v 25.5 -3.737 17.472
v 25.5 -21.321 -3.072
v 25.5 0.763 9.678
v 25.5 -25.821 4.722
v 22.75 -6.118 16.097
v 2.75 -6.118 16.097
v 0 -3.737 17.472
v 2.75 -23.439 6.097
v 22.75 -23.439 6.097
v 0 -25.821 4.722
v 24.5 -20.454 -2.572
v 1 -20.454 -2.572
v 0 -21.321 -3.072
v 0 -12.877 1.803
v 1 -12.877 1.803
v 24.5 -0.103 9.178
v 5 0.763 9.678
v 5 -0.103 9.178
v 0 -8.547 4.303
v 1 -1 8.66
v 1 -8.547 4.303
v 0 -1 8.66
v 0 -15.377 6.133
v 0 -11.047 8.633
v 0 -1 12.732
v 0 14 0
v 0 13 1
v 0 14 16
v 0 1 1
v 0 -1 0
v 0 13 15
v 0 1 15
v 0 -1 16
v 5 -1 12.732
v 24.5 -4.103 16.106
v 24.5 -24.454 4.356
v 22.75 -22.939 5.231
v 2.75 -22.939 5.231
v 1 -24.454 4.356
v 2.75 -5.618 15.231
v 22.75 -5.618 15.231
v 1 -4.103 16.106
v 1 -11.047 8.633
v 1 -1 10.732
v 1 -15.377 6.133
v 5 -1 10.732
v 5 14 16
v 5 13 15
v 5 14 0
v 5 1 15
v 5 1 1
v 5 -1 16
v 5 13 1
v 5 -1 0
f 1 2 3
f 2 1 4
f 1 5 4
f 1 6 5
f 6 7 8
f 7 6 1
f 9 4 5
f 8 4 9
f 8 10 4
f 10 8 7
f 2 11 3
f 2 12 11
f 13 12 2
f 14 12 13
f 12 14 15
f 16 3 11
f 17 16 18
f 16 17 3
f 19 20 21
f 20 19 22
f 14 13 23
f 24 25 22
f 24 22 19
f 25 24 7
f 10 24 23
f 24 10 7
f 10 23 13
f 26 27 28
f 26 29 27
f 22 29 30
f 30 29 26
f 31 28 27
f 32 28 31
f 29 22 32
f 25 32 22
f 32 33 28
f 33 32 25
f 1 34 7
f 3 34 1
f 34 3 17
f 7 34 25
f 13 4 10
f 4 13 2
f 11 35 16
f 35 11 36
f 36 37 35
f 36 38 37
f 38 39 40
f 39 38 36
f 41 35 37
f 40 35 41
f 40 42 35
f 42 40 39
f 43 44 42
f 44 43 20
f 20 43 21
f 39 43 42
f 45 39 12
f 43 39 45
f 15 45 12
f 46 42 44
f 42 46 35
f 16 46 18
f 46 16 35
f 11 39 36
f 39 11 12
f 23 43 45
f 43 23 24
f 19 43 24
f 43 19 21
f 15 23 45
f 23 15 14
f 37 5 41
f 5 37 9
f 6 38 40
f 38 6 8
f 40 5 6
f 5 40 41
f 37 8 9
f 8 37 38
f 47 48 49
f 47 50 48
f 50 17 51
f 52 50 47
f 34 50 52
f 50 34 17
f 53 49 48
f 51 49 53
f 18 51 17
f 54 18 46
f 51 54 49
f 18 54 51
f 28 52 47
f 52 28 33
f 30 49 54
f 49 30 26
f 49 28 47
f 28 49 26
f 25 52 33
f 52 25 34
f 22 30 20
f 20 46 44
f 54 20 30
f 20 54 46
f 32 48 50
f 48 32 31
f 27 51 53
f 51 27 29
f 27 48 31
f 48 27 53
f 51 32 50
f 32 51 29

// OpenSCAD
thickness = 2.5;
thicknessWC = 1;
length = 2.5;
lengthTop = 6.75;
gapWidth = 4.2;
pi = 3.141592653589793;
webcamSide = 23.5;
webcamSideCut = 20;
webcamHeight = 8;
barOffset = 15;
barLength = 60;
barDrop = 15;
wireHolderWidth = 2.75;
wireGapWidth = 5;
// Good w and w/o band
glassTouchpadHeight = 16.8;
glassTouchpadWidth = 7.55;


// Make webcam holder
rotate([30, 0, 0]) {
translate([0, -20, 8]) {
difference() {
cube([webcamSide + thicknessWC * 2, webcamSide + thicknessWC * 2, thicknessWC + webcamHeight]);
translate([thicknessWC, thicknessWC, -thicknessWC]) cube([webcamSide, webcamSide, webcamHeight + thicknessWC]);
translate([0, thicknessWC/2 + webcamSide / 2 - wireGapWidth / 2, -thicknessWC]) cube([webcamSide + thicknessWC, wireGapWidth, webcamHeight * 3 / 4]);
translate([thicknessWC + (webcamSide - webcamSideCut) / 2, thicknessWC + (webcamSide - webcamSideCut) / 2, webcamHeight]) cube([webcamSideCut, webcamSideCut, thicknessWC]);
}
}
}


thickness = 1;
prismHeight = 12;
prismWidth = 5;
prismDepth = 14;
mirrorSide = 25.7;
mirrorSideEdge = 4;
mirrorDepth = 2.5;
difference() {
translate([0, -thickness, 0]) cube([prismWidth, prismHeight + thickness * 3, prismDepth + thickness * 2]);
translate([0, thickness, thickness]) cube([prismWidth, prismHeight, prismDepth]);
translate([0, thickness, thickness]) circle(5);
}
